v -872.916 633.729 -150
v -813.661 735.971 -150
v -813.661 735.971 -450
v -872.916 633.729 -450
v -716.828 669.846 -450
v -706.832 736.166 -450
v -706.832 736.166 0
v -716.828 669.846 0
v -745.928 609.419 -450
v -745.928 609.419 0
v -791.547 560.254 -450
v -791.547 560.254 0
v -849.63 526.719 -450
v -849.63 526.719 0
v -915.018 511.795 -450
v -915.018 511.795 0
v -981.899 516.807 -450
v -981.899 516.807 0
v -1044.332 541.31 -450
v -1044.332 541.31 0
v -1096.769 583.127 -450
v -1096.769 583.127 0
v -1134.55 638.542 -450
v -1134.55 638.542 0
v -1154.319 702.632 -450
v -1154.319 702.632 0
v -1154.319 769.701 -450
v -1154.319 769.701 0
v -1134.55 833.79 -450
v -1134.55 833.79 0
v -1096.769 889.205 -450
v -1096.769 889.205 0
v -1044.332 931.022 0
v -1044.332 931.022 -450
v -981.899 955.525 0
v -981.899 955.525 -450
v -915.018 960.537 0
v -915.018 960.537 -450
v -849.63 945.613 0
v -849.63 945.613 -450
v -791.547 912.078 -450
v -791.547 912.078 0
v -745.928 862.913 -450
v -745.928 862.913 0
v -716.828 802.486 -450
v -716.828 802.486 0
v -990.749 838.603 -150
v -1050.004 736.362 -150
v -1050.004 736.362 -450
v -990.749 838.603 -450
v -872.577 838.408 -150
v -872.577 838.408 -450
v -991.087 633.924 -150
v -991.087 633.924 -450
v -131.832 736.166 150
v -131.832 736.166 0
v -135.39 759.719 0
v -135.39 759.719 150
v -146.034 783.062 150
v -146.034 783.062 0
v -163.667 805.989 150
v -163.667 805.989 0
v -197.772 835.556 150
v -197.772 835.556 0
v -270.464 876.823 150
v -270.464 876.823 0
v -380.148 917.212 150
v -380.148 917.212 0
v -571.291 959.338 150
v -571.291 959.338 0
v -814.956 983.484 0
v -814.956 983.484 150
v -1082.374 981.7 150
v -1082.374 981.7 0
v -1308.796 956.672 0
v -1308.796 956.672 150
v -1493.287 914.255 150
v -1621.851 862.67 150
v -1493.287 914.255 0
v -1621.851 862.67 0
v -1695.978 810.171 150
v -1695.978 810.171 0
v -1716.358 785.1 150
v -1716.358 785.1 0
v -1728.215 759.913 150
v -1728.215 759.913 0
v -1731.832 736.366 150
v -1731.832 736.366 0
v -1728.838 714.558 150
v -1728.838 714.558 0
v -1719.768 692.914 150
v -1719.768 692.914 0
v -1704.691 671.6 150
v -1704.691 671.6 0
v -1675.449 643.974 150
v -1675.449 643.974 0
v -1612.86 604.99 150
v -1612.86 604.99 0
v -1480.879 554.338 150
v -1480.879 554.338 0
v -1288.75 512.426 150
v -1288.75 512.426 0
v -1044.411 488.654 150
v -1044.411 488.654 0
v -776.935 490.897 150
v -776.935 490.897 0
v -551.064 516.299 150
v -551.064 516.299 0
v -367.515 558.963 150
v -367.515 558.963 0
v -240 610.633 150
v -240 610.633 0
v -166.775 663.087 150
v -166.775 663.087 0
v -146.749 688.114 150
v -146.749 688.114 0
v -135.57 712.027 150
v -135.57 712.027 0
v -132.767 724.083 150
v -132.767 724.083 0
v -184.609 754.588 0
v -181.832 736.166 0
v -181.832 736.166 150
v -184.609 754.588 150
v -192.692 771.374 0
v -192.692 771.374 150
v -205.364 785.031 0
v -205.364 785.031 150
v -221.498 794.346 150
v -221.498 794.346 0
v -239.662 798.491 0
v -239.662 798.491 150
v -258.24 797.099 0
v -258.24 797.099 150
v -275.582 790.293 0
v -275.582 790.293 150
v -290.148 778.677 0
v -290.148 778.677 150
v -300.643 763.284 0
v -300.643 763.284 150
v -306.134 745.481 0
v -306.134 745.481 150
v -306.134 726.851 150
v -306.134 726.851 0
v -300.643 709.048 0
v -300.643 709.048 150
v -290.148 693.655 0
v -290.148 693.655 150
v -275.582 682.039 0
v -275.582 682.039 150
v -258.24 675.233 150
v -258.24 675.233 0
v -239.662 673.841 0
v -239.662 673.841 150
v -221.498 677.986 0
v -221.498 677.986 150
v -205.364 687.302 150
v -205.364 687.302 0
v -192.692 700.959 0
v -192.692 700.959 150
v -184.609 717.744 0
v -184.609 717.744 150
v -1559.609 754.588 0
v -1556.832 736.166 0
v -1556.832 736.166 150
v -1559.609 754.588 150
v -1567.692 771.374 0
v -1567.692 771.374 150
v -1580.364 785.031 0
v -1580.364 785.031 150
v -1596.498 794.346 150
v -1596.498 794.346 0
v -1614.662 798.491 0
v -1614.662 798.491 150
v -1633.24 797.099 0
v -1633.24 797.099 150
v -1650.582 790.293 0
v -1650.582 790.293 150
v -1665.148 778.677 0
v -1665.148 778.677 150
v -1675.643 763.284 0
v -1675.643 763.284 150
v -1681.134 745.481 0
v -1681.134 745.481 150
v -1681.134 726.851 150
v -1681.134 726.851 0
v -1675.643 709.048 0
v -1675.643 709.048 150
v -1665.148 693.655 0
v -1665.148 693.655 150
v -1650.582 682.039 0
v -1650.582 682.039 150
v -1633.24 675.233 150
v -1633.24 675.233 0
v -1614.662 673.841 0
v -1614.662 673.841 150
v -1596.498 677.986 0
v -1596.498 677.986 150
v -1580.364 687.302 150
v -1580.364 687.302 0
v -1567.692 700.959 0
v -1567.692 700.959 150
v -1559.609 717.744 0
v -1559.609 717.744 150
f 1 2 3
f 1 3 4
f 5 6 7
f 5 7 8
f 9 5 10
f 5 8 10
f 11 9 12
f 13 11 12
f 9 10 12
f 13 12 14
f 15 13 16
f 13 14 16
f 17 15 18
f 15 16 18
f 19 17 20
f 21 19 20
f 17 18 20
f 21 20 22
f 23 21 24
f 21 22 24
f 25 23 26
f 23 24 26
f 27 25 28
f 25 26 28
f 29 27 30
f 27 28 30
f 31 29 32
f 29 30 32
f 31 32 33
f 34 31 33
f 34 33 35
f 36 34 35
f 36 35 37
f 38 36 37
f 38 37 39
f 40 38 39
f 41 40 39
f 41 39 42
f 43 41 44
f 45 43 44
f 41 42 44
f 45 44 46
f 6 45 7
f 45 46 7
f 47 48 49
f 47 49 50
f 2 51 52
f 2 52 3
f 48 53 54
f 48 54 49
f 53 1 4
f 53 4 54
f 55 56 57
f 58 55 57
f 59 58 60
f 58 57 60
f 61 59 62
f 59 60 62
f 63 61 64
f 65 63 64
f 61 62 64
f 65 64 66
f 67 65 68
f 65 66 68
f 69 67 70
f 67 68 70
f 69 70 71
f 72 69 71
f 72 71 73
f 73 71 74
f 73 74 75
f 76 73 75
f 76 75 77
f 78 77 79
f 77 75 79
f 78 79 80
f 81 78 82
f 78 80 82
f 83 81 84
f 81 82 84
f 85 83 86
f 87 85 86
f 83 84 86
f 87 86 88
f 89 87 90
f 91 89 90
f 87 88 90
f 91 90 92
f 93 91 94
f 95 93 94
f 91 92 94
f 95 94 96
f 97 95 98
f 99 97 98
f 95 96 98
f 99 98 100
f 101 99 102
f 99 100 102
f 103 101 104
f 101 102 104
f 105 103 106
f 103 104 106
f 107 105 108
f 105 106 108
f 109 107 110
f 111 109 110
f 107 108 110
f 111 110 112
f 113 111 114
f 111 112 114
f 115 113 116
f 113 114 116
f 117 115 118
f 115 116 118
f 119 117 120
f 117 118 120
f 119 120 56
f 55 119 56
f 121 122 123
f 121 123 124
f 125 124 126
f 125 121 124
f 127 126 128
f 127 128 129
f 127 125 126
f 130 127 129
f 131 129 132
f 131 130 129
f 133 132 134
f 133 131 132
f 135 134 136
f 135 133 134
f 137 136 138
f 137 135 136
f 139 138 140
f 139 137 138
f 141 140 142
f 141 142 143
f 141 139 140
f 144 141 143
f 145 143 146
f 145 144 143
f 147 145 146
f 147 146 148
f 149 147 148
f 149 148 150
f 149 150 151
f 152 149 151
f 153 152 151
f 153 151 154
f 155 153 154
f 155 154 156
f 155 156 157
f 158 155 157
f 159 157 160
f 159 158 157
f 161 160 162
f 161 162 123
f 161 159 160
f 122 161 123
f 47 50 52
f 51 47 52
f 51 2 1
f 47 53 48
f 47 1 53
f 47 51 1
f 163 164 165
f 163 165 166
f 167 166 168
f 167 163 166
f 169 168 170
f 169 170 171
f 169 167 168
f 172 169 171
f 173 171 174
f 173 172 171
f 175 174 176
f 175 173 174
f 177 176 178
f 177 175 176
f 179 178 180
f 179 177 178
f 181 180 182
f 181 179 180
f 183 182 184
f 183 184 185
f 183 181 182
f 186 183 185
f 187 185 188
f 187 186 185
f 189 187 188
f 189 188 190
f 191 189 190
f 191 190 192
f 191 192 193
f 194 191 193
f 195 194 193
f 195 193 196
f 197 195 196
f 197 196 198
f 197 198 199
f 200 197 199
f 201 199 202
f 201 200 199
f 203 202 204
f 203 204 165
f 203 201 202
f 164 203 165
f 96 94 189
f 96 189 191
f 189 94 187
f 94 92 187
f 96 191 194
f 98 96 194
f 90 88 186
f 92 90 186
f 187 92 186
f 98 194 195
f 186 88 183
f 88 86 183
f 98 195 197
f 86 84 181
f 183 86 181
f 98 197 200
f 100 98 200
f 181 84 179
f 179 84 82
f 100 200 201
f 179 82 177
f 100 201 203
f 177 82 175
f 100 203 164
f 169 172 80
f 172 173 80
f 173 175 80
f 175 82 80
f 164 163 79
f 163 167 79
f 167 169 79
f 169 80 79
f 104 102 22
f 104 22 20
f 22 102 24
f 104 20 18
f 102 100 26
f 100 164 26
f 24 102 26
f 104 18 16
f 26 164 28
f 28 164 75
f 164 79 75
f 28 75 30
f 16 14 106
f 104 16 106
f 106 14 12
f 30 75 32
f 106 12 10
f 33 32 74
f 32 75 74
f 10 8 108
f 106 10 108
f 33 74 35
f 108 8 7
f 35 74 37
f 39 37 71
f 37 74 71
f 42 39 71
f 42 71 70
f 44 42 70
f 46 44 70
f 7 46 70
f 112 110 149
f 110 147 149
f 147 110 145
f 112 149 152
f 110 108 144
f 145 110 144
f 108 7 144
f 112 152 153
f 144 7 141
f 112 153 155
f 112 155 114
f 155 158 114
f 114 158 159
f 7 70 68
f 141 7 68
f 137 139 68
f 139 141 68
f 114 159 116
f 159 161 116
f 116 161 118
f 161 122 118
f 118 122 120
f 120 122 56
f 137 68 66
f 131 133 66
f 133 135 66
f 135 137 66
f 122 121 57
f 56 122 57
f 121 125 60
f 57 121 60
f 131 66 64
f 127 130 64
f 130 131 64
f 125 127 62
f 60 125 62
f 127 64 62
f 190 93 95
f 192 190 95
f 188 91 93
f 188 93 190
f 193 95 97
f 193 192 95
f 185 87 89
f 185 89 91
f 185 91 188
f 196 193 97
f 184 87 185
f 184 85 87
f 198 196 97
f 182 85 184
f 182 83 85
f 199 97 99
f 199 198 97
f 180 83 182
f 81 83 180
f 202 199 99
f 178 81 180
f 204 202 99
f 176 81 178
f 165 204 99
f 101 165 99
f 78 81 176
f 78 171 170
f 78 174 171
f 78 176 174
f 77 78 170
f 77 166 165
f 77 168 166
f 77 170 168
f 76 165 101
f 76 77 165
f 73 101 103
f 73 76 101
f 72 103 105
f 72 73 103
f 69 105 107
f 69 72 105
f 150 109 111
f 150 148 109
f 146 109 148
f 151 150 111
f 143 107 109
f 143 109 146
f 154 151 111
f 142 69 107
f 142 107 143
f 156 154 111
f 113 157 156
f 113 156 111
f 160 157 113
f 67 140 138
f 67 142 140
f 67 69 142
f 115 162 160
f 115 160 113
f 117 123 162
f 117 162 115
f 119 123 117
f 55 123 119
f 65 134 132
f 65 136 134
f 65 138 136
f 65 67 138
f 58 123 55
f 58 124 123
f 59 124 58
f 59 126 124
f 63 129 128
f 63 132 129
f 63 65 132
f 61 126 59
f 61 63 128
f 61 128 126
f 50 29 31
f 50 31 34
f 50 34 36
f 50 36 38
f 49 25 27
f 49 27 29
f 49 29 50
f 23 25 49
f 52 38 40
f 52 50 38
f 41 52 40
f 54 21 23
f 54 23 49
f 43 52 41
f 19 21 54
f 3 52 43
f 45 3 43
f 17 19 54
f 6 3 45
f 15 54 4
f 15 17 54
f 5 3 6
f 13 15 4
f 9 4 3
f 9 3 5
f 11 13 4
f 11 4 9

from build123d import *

# Parameters (mm, degrees)
SKETCH1_RX           = 800
SKETCH1_RY           = 250
SKETCH1_R            = 62.5
BOSS_EXTRUDE1_DEPTH  = 150
BOSS_EXTRUDE9_DEPTH  = 150
SKETCH17_R           = 225
BOSS_EXTRUDE13_DEPTH = 450


with BuildPart() as part:
    # Sketch1 → Boss-Extrude1 (new body)
    with BuildSketch(Plane.XY):
        with Locations((-931.832148188, 736.166079396)):
            Ellipse(SKETCH1_RX, SKETCH1_RY)
        with Locations((-1619.332148188, 736.166079396)):
            Circle(SKETCH1_R, mode=Mode.SUBTRACT)
        with Locations((-244.332148188, 736.166079396)):
            Circle(SKETCH1_R, mode=Mode.SUBTRACT)
    extrude(amount=BOSS_EXTRUDE1_DEPTH)

    # Sketch12 → Boss-Extrude9 (add)
    with BuildSketch(Plane(origin=(0, 0, 0), x_dir=(-1, 0, 0), z_dir=(0, 0, -1))):
        Polygon((991.0872246, 633.924307933), (1050.003657809, 736.361595141), (990.748581397, 838.603366603), (872.577071776, 838.407850859), (813.660638567, 735.970563652), (872.915714979, 633.728792189), align=None)
    extrude(amount=BOSS_EXTRUDE9_DEPTH)

    # Sketch17 → Boss-Extrude13 (add)
    with BuildSketch(Plane(origin=(0, 0, 0), x_dir=(-1, 0, 0), z_dir=(0, 0, -1))):
        with Locations(Location((931.832148188, 736.166079396, 0), (0, 0, 180))):
            Circle(SKETCH17_R)
        Polygon((991.0872246, 633.924307933), (1050.003657809, 736.361595141), (990.748581397, 838.603366603), (872.577071776, 838.407850859), (813.660638567, 735.970563652), (872.915714979, 633.728792189), align=None, mode=Mode.SUBTRACT)
    extrude(amount=BOSS_EXTRUDE13_DEPTH)


solid = part.part
